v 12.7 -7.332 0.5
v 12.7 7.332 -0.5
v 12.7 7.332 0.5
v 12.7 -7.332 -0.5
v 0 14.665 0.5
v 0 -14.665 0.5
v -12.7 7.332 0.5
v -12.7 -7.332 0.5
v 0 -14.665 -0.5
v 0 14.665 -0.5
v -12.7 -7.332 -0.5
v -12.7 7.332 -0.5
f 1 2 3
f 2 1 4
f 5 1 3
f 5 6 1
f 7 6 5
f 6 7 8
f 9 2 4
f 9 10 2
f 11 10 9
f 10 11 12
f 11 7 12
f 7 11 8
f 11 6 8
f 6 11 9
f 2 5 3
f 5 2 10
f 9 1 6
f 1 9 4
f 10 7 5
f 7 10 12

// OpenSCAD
/*
	Usage:
	use <hexagon.scad>;
*/

//------------------------------------------------------------
// Demo
//------------------------------------------------------------
// OpenSCAD Resolution
$fn = 150;
// 1 inch wide hexagon, 1 mm deep
Hexagon(cle=25.4,h=1);

//------------------------------------------------------------
// Hexagon
// cle	écart, ex: clé de 12 alors cle=12
// h		hauteur
//------------------------------------------------------------
module Hexagon(cle,h)
{
	angle = 360/6;		// 6 pans
	cote = cle * cot(angle);
	echo(angle, cot(angle), cote);
	echo(acos(.6));

	union()
	{
		rotate([0,0,0])
			cube([cle,cote,h],center=true);
		rotate([0,0,angle])
			cube([cle,cote,h],center=true);
		rotate([0,0,2*angle])
			cube([cle,cote,h],center=true);
	}

// Vérification par un cercle de taille cle
//	#cylinder(r=cle/2,h=2*h,center=true);
//	%circle(r=cote,center=true);
//	#cube([cote,cote,1]);
}

//------------------------------------------------------------
// Fonction cotangente
// Permet d'avoir les bones dimensions
// utiliser $fn n'est pas bon
//------------------------------------------------------------
function cot(x)=1/tan(x);

//==EOF=======================================================
